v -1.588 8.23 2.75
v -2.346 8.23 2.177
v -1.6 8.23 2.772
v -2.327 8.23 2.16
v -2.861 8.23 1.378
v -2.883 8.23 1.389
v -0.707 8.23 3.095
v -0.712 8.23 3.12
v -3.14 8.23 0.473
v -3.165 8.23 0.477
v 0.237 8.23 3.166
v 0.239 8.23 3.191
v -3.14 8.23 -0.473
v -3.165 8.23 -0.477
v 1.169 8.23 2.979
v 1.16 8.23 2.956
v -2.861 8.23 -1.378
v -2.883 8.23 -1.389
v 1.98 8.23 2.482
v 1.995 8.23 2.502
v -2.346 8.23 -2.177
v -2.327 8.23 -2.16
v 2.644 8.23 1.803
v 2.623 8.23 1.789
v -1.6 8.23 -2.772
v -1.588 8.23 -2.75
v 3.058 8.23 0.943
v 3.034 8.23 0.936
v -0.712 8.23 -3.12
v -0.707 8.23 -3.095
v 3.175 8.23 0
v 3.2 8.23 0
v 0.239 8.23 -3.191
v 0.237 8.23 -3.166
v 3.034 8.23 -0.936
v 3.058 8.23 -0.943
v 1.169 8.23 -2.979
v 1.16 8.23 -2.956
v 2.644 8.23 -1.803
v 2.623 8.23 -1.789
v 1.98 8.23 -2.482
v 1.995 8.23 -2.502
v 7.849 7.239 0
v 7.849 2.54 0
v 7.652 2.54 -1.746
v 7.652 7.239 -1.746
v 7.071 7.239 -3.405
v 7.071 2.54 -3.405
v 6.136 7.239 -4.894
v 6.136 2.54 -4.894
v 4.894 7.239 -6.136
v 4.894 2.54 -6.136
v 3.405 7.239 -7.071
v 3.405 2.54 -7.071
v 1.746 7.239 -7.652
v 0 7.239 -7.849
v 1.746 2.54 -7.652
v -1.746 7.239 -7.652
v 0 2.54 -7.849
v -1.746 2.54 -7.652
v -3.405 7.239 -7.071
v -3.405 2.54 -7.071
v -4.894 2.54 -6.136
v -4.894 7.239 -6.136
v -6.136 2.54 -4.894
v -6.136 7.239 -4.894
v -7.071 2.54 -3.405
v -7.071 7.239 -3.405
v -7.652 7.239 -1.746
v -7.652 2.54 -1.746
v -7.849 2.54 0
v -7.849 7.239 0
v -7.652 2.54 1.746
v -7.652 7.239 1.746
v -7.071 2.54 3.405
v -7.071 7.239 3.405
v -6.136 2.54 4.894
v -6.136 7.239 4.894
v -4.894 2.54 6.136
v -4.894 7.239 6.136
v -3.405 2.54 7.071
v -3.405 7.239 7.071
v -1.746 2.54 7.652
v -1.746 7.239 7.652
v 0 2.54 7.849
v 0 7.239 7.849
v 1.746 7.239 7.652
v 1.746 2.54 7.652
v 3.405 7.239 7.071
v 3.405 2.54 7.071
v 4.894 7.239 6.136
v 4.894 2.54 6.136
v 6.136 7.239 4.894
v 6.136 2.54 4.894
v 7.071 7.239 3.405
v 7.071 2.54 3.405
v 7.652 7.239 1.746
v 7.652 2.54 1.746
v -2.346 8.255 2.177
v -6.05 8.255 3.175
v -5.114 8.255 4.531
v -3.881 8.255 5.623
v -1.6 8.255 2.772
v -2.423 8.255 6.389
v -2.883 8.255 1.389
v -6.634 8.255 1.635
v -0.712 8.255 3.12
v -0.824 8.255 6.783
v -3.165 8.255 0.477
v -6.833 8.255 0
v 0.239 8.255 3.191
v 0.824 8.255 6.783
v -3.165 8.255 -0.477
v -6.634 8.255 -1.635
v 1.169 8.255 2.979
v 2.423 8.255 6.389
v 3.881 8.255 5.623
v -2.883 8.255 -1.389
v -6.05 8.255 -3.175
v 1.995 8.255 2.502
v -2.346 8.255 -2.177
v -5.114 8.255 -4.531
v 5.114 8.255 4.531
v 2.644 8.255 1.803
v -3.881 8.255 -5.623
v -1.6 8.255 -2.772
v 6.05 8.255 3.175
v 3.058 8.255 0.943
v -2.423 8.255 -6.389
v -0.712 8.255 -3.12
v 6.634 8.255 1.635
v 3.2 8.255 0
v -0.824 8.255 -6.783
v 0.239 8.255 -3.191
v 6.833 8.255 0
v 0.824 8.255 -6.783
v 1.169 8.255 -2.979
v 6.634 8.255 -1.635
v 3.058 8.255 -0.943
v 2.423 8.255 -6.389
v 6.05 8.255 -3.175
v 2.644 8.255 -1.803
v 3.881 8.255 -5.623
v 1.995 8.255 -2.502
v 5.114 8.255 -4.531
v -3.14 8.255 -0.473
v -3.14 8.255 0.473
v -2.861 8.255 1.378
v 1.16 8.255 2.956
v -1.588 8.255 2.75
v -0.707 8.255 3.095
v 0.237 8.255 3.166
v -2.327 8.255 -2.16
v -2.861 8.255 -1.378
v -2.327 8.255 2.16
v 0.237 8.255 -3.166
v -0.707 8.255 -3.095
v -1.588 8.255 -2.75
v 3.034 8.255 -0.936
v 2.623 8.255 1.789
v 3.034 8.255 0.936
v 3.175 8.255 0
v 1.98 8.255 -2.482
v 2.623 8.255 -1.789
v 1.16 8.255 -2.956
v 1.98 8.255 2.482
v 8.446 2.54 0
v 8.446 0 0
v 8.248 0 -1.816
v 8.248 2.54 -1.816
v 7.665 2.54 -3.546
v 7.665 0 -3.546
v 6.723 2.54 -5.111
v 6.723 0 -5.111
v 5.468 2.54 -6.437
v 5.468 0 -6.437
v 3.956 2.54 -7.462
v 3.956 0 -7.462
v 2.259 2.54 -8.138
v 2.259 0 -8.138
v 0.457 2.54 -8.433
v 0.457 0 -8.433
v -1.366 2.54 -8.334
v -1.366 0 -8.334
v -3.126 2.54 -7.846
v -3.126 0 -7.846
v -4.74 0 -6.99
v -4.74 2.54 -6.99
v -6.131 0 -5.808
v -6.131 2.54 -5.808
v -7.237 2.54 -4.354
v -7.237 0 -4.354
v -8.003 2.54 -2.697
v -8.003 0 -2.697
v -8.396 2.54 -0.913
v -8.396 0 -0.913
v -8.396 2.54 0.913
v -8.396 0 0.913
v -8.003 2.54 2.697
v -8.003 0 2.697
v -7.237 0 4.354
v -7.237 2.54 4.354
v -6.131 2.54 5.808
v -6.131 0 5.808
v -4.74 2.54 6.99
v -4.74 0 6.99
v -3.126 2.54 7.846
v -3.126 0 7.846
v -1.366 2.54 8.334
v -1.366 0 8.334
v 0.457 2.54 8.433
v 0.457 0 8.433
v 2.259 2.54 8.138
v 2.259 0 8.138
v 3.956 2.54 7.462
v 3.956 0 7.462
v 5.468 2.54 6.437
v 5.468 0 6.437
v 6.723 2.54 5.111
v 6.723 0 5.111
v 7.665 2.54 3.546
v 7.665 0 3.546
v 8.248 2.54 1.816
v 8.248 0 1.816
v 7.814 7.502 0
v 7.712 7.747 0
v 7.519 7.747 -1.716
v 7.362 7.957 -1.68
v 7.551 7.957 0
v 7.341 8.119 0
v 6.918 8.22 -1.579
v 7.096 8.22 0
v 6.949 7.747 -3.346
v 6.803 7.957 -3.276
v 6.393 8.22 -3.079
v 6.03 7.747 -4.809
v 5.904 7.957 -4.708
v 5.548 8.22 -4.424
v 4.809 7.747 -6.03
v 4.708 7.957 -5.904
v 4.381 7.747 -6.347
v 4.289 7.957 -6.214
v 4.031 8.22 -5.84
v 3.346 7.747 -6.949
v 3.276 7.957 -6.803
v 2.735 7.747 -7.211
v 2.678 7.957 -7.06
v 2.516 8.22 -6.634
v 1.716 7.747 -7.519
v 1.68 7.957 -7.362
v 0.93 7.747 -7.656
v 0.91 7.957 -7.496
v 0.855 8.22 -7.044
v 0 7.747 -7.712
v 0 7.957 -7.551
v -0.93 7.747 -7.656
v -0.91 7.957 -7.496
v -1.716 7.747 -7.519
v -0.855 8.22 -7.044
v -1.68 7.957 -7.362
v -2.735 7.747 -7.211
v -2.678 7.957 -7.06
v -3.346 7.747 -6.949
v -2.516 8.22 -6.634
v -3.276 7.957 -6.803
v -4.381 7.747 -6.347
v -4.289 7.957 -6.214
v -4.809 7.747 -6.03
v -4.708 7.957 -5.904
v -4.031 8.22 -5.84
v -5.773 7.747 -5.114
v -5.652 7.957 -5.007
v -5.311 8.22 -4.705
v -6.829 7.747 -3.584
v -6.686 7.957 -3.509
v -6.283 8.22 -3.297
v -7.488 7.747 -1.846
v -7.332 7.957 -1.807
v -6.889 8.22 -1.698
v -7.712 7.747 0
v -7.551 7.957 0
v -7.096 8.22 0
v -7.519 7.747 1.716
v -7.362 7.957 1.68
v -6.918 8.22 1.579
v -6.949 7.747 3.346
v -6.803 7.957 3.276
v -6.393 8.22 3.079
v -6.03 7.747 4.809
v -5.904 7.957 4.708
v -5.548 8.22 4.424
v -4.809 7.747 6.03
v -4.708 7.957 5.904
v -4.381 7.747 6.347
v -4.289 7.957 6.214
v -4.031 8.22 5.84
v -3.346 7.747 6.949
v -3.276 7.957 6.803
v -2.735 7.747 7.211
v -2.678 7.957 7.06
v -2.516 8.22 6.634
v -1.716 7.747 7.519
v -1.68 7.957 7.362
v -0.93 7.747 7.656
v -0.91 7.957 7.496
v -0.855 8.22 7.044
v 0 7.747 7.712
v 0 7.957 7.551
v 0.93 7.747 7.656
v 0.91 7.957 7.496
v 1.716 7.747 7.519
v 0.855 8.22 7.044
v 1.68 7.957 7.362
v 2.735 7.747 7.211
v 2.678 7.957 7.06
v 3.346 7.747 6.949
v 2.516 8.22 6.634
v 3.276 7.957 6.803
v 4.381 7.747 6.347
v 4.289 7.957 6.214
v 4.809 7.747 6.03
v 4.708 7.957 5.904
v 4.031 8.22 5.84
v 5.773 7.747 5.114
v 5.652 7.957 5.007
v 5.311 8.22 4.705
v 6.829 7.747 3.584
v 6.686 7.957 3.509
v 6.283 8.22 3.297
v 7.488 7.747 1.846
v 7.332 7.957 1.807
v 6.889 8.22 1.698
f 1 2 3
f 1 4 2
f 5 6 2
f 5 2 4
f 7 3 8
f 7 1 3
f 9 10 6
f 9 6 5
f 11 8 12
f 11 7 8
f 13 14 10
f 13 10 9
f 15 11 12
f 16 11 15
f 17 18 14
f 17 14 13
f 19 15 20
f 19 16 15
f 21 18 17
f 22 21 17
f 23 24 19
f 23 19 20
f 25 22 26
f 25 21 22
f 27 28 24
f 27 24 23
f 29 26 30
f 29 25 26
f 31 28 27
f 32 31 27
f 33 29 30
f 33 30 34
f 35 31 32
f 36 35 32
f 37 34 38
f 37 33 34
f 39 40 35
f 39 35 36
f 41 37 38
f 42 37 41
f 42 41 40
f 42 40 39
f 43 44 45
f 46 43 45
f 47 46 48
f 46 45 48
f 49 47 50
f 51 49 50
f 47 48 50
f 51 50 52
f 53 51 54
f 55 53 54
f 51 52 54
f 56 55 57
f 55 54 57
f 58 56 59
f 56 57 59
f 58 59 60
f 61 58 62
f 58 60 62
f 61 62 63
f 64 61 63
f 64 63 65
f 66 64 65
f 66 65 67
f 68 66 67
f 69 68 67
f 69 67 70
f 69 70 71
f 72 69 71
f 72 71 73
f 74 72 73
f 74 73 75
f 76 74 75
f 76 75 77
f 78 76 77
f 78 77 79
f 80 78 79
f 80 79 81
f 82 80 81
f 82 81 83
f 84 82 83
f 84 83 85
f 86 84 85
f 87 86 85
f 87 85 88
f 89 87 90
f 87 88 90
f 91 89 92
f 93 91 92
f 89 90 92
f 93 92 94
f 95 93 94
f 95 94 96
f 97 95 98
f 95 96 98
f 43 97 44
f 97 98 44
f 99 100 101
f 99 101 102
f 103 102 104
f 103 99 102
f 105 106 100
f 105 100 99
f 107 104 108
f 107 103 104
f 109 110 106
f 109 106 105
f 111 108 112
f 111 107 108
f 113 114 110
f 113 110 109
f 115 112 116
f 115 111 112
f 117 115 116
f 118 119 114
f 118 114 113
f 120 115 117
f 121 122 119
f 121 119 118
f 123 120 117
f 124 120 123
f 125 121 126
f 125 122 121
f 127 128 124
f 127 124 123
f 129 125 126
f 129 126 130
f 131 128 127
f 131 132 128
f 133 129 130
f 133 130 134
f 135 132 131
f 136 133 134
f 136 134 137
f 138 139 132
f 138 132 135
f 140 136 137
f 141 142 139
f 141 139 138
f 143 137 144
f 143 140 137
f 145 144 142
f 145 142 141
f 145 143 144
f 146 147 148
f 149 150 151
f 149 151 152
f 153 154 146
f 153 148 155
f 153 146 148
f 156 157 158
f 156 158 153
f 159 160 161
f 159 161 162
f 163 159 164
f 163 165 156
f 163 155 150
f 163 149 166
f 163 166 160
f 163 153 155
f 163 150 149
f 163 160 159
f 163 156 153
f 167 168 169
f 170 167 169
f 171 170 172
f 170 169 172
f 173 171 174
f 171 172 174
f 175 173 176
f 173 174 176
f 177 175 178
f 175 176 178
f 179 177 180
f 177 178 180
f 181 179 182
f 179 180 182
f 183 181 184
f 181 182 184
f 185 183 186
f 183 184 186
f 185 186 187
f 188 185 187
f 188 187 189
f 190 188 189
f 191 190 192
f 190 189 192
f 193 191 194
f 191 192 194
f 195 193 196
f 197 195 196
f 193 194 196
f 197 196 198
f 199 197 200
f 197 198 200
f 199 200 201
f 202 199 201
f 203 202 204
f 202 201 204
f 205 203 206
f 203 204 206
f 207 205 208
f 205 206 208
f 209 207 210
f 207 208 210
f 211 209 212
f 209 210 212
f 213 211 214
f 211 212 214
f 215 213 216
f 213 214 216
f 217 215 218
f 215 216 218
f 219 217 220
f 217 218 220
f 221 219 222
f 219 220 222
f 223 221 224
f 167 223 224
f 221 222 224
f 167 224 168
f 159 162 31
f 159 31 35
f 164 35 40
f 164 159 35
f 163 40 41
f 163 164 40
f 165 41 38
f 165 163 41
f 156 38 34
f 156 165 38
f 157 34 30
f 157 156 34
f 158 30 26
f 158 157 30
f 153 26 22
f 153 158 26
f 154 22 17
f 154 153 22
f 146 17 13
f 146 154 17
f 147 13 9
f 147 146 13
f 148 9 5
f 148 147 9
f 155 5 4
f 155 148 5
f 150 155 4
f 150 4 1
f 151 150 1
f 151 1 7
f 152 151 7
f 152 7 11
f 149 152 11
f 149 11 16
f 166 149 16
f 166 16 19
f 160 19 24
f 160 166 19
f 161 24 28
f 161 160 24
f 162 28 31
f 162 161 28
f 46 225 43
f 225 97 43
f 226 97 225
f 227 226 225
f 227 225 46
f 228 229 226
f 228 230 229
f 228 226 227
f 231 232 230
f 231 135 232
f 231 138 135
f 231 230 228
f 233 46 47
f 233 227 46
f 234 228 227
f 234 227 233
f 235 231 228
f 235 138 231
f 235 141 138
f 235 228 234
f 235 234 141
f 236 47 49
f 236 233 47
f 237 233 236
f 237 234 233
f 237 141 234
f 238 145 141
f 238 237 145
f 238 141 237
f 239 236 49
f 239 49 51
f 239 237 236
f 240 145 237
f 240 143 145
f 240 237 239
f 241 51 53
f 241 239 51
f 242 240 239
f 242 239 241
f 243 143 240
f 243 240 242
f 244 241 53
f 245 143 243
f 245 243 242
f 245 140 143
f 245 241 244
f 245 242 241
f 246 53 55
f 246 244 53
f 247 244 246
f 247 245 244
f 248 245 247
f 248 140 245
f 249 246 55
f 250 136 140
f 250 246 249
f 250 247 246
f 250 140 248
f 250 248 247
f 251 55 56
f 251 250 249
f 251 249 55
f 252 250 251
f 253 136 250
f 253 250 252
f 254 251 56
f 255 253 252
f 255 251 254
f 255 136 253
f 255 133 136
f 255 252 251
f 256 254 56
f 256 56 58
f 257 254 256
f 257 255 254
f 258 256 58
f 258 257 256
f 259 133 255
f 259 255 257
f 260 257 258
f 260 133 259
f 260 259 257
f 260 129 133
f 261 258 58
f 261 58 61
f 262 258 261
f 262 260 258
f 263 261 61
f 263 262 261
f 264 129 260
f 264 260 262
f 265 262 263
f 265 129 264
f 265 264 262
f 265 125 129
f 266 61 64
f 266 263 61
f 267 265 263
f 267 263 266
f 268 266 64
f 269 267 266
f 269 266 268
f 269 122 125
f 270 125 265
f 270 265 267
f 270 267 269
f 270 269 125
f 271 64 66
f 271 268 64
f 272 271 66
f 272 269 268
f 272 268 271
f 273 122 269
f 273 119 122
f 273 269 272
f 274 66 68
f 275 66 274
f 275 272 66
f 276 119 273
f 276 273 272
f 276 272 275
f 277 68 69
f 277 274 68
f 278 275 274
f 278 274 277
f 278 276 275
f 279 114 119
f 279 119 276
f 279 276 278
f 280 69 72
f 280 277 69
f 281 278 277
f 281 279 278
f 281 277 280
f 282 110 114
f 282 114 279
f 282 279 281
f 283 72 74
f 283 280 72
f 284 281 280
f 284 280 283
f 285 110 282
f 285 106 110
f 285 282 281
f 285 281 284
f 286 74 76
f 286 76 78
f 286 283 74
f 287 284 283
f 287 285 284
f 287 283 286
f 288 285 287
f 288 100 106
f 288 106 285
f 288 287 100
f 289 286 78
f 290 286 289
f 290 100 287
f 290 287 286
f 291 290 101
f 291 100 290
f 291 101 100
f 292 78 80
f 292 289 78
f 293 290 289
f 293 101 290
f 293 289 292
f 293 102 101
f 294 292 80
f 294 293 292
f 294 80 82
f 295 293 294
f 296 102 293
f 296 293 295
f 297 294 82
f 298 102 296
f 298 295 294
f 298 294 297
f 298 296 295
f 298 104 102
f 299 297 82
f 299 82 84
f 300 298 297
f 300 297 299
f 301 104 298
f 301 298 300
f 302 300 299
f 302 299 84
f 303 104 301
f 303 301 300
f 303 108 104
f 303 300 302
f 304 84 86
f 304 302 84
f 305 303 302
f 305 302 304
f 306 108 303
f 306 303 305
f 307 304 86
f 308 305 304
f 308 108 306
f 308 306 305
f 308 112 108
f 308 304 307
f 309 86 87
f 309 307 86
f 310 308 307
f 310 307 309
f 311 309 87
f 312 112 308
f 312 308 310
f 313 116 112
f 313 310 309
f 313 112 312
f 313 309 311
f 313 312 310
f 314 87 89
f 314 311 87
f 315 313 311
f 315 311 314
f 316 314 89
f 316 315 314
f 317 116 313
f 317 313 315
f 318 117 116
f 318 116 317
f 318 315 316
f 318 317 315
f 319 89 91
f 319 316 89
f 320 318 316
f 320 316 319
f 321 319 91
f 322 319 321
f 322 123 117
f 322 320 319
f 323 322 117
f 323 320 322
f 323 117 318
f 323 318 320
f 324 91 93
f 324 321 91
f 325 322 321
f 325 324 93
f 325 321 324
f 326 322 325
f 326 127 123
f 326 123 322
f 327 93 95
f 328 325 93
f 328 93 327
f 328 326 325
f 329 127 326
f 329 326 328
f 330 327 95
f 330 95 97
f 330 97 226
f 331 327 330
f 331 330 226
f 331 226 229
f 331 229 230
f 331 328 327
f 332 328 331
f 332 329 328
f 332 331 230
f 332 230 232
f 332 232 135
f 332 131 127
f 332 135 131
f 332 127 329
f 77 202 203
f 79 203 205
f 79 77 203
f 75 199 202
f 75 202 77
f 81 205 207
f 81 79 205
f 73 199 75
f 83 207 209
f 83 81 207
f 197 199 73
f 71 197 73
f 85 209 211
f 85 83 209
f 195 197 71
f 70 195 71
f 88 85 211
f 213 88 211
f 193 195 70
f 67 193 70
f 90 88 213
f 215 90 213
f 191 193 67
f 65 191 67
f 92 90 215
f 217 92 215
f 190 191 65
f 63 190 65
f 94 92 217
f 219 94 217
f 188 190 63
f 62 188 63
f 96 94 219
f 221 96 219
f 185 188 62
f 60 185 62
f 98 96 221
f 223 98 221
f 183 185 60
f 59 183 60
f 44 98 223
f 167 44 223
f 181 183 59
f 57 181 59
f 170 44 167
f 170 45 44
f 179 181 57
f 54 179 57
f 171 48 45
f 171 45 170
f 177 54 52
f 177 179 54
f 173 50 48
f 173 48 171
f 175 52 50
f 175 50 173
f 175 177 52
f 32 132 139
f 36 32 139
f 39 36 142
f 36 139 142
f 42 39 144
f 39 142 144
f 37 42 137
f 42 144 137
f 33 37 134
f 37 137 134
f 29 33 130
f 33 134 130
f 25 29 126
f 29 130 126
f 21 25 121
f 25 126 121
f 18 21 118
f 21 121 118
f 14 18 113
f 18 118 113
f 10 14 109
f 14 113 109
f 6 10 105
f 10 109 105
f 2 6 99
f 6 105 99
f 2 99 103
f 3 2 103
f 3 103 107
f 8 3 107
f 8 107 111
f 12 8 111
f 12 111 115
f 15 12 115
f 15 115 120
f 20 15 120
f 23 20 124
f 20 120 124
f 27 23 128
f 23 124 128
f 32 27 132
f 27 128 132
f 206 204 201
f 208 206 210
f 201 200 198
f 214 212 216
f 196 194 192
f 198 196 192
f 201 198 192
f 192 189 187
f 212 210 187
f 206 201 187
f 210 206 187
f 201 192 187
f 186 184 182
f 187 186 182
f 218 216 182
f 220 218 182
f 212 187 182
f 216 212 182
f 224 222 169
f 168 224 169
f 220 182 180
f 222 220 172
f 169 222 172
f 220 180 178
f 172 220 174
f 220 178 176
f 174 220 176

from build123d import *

# Parameters (mm, degrees)
SKETCH1_R               = 8.4455
BOSS_EXTRUDE1_DEPTH     = 2.54
SKETCH2_R               = 7.8486
BOSS_EXTRUDE2_DEPTH     = 8.255
FILLET1_R               = 1.016
SKETCH3_R               = 3.2004
SKETCH3_R_2             = 3.175
CUT_EXTRUDE_THIN1_DEPTH = 0.0254


with BuildPart() as part:
    # Sketch1 → Boss-Extrude1 (new body)
    with BuildSketch(Plane(origin=(0, 0, 0), x_dir=(1, 0, 0), z_dir=(0, 1, 0))):
        Circle(SKETCH1_R)
    extrude(amount=BOSS_EXTRUDE1_DEPTH)

    # Sketch2 → Boss-Extrude2 (add)
    with BuildSketch(Plane(origin=(0, 0, 0), x_dir=(1, 0, 0), z_dir=(0, 1, 0))):
        Circle(SKETCH2_R)
    extrude(amount=BOSS_EXTRUDE2_DEPTH)

    # Fillet1
    fillet1_edges = [part.edges().sort_by_distance(p)[0] for p in [
        (-7.8486, 8.255, 0),
    ]]
    fillet(fillet1_edges, radius=FILLET1_R)

    # Sketch3 → Cut-Extrude-Thin1 (cut)
    with BuildSketch(Plane(origin=(0, 8.255, 0), x_dir=(1, 0, 0), z_dir=(0, 1, 0))):
        Circle(SKETCH3_R)
        Circle(SKETCH3_R_2, mode=Mode.SUBTRACT)
    extrude(amount=-CUT_EXTRUDE_THIN1_DEPTH, mode=Mode.SUBTRACT)


solid = part.part
